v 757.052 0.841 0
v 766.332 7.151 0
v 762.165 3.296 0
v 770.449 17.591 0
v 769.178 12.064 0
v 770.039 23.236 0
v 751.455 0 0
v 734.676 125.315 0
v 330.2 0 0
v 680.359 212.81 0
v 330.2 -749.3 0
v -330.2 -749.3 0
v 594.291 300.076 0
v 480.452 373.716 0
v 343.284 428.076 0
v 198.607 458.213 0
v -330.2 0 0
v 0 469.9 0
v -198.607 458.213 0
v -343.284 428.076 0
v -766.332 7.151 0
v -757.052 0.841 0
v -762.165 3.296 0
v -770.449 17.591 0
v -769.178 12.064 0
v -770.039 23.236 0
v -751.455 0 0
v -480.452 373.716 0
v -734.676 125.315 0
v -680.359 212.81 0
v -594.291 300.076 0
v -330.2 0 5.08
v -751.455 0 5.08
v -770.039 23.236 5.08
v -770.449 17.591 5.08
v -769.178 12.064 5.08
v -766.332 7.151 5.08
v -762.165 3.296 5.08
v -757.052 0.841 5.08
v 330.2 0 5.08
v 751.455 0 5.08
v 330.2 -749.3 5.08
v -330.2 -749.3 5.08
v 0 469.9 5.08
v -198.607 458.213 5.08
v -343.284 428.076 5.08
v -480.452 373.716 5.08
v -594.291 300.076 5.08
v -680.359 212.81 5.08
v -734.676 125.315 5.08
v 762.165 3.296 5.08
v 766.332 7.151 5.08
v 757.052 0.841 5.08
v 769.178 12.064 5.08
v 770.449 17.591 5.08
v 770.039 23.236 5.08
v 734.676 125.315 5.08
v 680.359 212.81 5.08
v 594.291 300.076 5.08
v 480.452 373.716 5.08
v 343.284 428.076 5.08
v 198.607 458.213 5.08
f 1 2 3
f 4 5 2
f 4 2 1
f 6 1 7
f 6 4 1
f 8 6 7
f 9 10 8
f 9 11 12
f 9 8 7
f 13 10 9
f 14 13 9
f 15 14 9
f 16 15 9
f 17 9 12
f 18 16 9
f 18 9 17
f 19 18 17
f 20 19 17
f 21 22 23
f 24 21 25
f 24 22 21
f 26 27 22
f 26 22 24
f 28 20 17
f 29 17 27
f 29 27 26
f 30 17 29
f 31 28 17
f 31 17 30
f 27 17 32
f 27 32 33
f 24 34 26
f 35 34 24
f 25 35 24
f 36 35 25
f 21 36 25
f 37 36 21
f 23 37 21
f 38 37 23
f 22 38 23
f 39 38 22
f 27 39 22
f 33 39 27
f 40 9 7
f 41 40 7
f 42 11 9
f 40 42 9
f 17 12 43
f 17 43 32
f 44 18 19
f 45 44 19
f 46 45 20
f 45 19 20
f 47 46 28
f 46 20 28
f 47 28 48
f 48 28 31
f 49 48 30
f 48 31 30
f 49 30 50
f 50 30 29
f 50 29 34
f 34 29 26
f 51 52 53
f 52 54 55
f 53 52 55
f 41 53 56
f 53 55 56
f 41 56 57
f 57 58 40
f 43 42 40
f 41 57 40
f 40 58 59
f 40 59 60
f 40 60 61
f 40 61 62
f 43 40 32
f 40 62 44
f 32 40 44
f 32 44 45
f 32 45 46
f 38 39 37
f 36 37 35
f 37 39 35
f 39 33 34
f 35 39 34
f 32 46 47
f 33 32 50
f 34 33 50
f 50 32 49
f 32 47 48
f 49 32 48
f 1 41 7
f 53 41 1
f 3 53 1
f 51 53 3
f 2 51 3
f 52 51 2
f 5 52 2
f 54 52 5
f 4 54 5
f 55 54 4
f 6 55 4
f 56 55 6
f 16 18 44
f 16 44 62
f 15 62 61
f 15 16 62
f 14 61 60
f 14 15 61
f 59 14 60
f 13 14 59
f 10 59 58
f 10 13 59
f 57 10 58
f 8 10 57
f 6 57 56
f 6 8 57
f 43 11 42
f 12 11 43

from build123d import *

# Parameters (mm, degrees)
F1_DEPTH = 5.08
F3_R     = 19.05


with BuildPart() as f1:
    # F0 (on Top) → F1 (new body)
    with BuildSketch(Plane.XY):
        with BuildLine():
            Line((330.2, -749.3), (330.2, 0))
            Line((330.2, 0), (774.7, 0))
            add(Edge.make_bspline(
                [(0, 469.9), (34.1164730489, 469.9), (385.0416966647, 476.161289739), (732.4479509774, 239.6232774633), (774.7, 0)],
                knots=[0, 0, 0, 0, 0.4227573718, 1, 1, 1, 1], degree=3))
            Line((0, 469.9), (0, 0))
            Line((0, 0), (0, -749.3))
            Line((0, -749.3), (330.2, -749.3))
        make_face()
    extrude(amount=F1_DEPTH)

    # F2: F1 across face


with BuildPart() as f1_1:
    add(f1.part)
    add(f1.part.mirror(Plane(origin=(0, -139.7, 2.54), x_dir=(0, -1, 0), z_dir=(-1, 0, 0))))

    # F3
    f3_edges = [f1_1.edges().sort_by_distance(p)[0] for p in [
        (-774.7, 0, 2.54),
        (774.7, 0, 2.54),
    ]]
    fillet(f3_edges, radius=F3_R)


solid = f1_1.part
